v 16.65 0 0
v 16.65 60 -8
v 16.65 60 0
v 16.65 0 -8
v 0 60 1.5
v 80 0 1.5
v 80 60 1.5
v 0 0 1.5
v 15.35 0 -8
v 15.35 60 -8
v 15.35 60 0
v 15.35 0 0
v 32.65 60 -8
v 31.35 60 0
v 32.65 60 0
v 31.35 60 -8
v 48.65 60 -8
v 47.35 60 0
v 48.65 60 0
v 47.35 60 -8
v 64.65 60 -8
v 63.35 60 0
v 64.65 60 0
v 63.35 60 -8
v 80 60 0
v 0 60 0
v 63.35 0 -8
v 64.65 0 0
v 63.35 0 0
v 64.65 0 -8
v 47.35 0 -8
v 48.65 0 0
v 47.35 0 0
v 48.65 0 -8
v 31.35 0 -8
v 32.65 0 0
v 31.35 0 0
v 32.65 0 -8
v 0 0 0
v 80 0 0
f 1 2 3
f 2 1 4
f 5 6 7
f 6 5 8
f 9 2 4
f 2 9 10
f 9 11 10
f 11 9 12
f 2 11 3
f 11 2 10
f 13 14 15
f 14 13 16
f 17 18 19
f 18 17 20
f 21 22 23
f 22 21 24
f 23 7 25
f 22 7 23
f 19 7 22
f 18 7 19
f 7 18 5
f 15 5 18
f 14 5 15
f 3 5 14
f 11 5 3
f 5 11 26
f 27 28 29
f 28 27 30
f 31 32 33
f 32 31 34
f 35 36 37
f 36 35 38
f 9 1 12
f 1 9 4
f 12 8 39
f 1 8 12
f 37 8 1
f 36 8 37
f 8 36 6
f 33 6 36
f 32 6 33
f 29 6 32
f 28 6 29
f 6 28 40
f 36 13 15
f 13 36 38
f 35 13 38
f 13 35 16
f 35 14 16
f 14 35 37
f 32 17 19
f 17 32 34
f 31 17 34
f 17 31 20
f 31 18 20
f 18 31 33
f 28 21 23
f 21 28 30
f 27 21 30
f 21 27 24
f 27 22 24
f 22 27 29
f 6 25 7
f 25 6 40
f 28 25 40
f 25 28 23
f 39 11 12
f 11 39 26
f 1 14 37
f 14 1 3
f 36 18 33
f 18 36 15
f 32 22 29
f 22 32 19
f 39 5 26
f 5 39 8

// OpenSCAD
$fn = 32;

// ----------------------------------------------------------------------
// Ribbed panel: 1.5 mm panel
// ----------------------------------------------------------------------

// --- parameters (mm) ---
panel_l = 80;             // panel length, X
panel_w = 60;             // panel width, Y
panel_t = 1.5;            // panel thickness, Z
rib_t = 1.3;              // rib thickness
rib_h = 8;                // rib height below the panel
ribs = 4;                 // number of ribs

total_h = panel_t + rib_h;  // overall height

union() {
  cube([panel_l, panel_w, panel_t]);
  for (i = [1 : ribs])
    translate([i * panel_l / (ribs + 1) - rib_t / 2, 0, -rib_h])
      cube([rib_t, panel_w, rib_h + panel_t]);
}
